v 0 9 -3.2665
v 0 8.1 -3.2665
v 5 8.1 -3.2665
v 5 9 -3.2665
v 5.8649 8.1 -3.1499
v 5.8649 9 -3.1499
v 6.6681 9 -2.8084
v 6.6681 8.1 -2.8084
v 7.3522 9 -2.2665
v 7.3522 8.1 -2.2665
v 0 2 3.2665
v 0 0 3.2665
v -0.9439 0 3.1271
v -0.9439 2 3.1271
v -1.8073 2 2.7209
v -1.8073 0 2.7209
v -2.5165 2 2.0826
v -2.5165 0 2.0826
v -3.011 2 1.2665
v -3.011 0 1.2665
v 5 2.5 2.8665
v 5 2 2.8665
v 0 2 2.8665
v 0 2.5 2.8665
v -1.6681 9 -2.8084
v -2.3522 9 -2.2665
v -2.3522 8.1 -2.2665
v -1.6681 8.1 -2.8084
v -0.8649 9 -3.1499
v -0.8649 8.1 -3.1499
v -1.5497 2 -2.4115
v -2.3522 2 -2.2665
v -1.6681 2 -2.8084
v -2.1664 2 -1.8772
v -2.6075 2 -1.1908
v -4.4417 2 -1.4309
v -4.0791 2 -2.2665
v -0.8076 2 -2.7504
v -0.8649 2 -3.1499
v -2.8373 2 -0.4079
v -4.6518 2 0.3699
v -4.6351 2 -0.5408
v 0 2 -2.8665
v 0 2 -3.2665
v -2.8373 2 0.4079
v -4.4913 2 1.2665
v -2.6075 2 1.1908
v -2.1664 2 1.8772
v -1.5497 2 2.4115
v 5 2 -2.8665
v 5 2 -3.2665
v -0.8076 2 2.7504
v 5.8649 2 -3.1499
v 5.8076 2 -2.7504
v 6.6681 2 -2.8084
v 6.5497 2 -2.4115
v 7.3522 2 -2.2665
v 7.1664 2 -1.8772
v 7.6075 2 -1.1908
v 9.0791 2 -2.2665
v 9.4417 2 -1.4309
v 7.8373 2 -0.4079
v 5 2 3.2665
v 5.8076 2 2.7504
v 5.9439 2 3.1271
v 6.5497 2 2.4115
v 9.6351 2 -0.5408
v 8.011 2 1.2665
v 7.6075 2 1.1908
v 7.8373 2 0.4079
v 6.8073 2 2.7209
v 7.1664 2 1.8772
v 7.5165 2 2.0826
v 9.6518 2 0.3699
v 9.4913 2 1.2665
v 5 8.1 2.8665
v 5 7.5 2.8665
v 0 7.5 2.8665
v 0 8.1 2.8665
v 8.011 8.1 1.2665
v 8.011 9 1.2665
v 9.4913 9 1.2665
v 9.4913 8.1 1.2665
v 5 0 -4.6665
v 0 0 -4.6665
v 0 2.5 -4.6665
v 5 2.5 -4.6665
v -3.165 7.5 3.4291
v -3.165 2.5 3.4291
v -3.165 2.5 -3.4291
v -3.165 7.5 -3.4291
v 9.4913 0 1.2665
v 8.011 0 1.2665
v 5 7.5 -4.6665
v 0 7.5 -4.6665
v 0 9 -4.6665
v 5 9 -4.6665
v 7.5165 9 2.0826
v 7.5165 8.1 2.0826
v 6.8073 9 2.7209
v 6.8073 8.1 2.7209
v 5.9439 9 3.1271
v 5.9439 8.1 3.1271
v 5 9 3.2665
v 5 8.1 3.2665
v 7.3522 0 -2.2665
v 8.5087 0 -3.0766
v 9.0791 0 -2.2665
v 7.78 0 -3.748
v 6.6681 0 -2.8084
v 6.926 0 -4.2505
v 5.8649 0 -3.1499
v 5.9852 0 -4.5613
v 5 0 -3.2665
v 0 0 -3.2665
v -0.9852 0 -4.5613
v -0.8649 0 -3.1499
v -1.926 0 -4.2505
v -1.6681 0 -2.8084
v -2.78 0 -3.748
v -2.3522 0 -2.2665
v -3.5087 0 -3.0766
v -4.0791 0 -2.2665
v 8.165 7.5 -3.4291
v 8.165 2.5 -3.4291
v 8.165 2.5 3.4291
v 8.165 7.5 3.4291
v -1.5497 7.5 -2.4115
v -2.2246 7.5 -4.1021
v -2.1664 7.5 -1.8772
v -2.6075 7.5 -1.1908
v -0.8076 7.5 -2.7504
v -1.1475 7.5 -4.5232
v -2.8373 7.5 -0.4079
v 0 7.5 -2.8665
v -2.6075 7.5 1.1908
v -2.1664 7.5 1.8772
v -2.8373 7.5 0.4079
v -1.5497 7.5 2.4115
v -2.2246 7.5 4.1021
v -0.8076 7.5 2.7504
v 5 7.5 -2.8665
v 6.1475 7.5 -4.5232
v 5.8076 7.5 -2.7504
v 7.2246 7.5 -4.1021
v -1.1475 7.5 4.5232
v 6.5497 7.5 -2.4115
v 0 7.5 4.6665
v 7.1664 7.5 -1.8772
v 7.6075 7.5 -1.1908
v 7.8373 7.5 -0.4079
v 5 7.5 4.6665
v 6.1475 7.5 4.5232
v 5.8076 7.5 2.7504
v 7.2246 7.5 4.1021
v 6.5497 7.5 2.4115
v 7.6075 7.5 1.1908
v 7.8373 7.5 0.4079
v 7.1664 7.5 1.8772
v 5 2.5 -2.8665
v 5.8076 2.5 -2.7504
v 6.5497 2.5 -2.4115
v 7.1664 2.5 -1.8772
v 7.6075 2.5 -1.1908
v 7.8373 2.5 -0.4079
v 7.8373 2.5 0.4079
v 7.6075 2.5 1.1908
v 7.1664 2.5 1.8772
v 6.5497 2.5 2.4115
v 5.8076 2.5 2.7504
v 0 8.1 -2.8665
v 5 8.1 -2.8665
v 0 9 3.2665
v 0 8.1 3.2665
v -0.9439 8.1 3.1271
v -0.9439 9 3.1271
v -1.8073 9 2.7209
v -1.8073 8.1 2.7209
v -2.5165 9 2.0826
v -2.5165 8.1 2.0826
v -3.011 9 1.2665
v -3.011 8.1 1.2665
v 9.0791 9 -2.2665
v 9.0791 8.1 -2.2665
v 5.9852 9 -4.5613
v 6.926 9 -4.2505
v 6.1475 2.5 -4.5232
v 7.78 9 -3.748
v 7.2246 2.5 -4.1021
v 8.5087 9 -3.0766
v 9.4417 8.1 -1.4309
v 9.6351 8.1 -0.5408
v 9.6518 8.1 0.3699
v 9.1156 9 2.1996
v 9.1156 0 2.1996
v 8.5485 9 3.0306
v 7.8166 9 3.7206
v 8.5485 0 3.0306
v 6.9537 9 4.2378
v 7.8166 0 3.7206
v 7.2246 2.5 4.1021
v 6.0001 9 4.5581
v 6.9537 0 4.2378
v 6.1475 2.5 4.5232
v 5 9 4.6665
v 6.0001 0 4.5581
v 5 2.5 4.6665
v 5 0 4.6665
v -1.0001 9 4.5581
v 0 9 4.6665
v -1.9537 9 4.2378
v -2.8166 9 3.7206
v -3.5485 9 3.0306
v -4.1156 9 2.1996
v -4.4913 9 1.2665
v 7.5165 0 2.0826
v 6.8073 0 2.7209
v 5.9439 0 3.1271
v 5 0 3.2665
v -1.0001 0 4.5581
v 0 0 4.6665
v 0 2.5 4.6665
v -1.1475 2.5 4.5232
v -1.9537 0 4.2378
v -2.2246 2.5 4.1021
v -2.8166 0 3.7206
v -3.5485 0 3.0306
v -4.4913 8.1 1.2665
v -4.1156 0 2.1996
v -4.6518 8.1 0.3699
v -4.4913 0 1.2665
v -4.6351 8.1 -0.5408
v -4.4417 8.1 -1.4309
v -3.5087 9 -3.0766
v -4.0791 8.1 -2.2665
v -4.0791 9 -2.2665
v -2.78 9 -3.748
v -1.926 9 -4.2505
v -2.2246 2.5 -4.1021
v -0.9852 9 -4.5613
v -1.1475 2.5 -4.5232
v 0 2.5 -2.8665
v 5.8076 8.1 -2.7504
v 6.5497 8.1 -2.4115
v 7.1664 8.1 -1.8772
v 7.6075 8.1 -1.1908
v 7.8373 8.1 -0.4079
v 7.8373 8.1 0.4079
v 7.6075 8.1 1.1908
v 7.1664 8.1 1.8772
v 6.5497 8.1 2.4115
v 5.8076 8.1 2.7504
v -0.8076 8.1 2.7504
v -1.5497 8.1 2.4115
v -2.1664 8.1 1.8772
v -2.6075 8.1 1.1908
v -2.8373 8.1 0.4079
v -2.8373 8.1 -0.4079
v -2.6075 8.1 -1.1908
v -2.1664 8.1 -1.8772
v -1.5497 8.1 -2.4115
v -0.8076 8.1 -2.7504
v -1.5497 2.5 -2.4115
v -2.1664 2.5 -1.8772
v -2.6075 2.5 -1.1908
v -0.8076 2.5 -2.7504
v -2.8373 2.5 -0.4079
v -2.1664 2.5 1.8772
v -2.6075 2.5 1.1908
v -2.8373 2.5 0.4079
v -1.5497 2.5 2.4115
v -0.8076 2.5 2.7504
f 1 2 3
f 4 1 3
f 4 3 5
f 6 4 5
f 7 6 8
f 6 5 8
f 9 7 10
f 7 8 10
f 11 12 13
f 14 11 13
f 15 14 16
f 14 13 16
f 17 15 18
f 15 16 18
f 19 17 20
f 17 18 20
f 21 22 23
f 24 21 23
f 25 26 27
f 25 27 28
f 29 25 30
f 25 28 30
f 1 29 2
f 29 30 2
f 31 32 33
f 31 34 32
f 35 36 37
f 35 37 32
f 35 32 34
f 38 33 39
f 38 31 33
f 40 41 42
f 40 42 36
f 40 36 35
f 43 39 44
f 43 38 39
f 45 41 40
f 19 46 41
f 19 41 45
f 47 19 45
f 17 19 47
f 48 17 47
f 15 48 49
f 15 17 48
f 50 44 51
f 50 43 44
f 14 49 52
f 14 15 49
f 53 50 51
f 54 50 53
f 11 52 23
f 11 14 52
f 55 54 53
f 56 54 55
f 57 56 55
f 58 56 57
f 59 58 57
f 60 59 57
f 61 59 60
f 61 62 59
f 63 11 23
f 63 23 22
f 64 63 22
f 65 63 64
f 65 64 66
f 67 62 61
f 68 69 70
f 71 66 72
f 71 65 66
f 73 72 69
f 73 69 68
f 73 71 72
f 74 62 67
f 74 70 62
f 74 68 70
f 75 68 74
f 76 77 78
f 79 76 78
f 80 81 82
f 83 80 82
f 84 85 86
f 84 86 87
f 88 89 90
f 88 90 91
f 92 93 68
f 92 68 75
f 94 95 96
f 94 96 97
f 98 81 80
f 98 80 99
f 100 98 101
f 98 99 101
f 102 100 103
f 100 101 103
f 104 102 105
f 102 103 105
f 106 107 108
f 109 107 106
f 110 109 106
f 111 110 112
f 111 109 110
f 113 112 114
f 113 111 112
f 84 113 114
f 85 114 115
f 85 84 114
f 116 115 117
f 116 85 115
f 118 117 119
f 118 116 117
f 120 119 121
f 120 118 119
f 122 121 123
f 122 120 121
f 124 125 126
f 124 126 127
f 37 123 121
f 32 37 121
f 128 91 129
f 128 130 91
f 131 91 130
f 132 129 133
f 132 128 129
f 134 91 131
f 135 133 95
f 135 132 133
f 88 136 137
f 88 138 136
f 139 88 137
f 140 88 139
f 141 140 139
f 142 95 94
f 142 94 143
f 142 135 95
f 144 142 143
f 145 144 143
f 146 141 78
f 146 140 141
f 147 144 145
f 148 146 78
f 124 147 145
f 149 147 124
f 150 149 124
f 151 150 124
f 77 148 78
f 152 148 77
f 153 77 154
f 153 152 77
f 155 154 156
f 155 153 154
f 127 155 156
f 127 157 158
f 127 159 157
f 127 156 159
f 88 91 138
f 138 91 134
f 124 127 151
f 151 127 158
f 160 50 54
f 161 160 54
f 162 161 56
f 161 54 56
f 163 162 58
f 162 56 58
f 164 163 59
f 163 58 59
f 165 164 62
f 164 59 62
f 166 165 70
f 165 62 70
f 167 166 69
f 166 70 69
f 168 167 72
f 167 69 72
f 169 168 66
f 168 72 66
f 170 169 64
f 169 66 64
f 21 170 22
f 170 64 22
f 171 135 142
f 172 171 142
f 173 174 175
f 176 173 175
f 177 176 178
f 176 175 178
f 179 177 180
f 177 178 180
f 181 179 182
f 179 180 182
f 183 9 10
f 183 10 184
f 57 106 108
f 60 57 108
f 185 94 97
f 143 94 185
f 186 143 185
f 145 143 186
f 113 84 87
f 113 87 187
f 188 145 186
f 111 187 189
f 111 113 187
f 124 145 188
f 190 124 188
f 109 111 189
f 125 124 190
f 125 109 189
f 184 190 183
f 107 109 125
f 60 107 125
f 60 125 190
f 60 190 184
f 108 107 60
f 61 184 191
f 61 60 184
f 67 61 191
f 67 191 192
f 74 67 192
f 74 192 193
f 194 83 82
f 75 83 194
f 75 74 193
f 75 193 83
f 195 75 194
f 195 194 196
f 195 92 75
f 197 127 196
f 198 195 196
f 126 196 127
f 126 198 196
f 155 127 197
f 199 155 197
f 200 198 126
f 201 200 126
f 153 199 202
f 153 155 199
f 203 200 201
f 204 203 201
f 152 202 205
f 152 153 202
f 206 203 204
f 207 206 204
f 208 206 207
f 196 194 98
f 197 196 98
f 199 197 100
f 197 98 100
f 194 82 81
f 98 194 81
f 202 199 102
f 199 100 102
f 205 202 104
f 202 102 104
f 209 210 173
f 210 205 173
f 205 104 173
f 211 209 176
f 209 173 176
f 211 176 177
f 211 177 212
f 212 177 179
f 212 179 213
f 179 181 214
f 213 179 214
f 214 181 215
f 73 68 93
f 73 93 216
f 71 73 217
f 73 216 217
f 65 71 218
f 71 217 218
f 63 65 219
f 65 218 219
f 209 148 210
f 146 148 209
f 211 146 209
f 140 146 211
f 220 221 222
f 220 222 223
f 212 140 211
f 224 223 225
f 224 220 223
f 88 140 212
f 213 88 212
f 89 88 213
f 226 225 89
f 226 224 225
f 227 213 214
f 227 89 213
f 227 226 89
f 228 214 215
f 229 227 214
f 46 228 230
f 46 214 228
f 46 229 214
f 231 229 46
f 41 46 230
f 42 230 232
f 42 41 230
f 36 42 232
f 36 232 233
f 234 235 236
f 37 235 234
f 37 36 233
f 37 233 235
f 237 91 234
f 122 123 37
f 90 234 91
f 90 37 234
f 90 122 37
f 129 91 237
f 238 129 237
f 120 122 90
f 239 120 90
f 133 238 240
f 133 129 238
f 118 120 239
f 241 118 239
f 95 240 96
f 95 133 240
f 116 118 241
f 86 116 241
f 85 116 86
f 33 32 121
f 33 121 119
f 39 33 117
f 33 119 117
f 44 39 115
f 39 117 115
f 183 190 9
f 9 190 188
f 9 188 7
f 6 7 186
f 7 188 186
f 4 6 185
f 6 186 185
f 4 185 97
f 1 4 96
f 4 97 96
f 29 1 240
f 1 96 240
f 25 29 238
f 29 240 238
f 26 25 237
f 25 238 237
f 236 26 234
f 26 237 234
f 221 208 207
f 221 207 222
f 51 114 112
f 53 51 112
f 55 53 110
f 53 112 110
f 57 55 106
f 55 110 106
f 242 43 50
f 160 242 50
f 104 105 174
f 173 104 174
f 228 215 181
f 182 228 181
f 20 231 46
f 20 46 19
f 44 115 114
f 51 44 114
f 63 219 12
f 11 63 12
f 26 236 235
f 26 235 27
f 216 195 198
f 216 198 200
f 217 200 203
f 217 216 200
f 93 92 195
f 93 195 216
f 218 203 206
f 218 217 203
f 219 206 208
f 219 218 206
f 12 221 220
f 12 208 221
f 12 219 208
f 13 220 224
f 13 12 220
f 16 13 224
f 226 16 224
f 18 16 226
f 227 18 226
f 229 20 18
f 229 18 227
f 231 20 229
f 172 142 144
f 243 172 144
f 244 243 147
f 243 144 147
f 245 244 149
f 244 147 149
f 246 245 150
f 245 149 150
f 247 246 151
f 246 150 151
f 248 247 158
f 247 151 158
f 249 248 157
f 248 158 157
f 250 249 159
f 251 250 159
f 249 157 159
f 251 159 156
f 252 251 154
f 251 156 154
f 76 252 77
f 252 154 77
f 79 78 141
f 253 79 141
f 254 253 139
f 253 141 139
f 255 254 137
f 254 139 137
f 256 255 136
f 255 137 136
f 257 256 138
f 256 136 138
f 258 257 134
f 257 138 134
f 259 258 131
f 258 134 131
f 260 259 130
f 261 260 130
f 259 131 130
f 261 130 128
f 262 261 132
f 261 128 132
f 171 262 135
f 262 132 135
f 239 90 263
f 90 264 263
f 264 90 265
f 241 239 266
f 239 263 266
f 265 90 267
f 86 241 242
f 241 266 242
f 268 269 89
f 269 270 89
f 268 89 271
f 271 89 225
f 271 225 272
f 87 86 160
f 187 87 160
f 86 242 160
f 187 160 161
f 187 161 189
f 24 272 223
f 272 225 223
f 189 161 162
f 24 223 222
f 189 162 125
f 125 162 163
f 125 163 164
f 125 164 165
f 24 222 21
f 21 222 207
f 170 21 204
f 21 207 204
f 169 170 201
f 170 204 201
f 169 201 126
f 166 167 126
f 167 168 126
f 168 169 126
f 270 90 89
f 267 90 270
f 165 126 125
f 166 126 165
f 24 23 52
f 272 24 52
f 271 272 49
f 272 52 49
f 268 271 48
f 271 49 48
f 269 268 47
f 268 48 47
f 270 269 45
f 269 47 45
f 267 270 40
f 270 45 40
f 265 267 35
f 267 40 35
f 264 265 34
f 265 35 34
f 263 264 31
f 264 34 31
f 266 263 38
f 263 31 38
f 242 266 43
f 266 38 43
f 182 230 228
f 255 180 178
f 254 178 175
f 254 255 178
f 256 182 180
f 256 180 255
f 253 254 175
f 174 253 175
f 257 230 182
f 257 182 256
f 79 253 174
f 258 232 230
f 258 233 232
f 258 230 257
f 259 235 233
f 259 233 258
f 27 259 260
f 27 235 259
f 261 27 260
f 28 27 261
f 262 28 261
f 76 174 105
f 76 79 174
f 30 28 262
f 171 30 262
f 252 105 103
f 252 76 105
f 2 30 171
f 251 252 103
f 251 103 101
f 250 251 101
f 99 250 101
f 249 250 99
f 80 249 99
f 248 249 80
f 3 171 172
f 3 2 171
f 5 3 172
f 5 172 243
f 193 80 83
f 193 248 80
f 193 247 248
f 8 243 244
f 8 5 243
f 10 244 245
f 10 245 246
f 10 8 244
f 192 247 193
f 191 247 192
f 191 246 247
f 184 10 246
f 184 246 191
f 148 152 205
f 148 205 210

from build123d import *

# Parameters (mm, degrees)
BOSS_EXTRUDE1_DEPTH = 9
BOSS_EXTRUDE2_DEPTH = 6.1
SKETCH3_W           = 11.33
SKETCH3_H           = 5
CUT_EXTRUDE1_DEPTH  = 10
SKETCH4_W           = 15
SKETCH4_H           = 3.533
CUT_EXTRUDE2_DEPTH  = 0.9
SKETCH5_W           = 15
SKETCH5_H           = 3.533
CUT_EXTRUDE3_DEPTH  = 2


with BuildPart() as part:
    # Sketch1 → Boss-Extrude1 (new body)
    with BuildSketch(Plane(origin=(0, 0, 0), x_dir=(1, 0, 0), z_dir=(0, 1, 0))):
        with BuildLine():
            Line((0, 4.6665), (5, 4.6665))
            ThreePointArc((5, 4.6665), (9.6665, 0), (5, -4.6665))
            Line((5, -4.6665), (0, -4.6665))
            ThreePointArc((0, -4.6665), (-4.6665, 0), (0, 4.6665))
        make_face()
        with BuildLine():
            Line((0, 3.2665), (5, 3.2665))
            ThreePointArc((5, 3.2665), (8.2665, 0), (5, -3.2665))
            Line((5, -3.2665), (0, -3.2665))
            ThreePointArc((0, -3.2665), (-3.2665, 0), (0, 3.2665))
        make_face(mode=Mode.SUBTRACT)
    extrude(amount=BOSS_EXTRUDE1_DEPTH)

    # Sketch2 → Boss-Extrude2 (add)
    with BuildSketch(Plane(origin=(0, 2, 0), x_dir=(1, 0, 0), z_dir=(0, 1, 0))):
        with BuildLine():
            Line((0, 3.2665), (5, 3.2665))
            ThreePointArc((5, 3.2665), (8.2665, 0), (5, -3.2665))
            Line((5, -3.2665), (0, -3.2665))
            ThreePointArc((0, -3.2665), (-3.2665, 0), (0, 3.2665))
        make_face()
        with BuildLine():
            Line((0, 2.8665), (5, 2.8665))
            ThreePointArc((5, 2.8665), (7.8665, 0), (5, -2.8665))
            Line((5, -2.8665), (0, -2.8665))
            ThreePointArc((0, -2.8665), (-2.8665, 0), (0, 2.8665))
        make_face(mode=Mode.SUBTRACT)
    extrude(amount=BOSS_EXTRUDE2_DEPTH)

    # Sketch3 → Cut-Extrude1 (cut)
    with BuildSketch(Plane.XY.offset(4.6665)):
        with Locations((2.5, 5)):
            Rectangle(SKETCH3_W, SKETCH3_H)
    extrude(amount=-CUT_EXTRUDE1_DEPTH, mode=Mode.SUBTRACT)

    # Sketch4 → Cut-Extrude2 (cut)
    with BuildSketch(Plane(origin=(0, 9, 0), x_dir=(1, 0, 0), z_dir=(0, 1, 0))):
        with Locations((2.5, 0.5)):
            Rectangle(SKETCH4_W, SKETCH4_H)
    extrude(amount=-CUT_EXTRUDE2_DEPTH, mode=Mode.SUBTRACT)

    # Sketch5 → Cut-Extrude3 (cut)
    with BuildSketch(Plane.XZ):
        with Locations((2.5, -0.5)):
            Rectangle(SKETCH5_W, SKETCH5_H)
    extrude(amount=-CUT_EXTRUDE3_DEPTH, mode=Mode.SUBTRACT)


solid = part.part
